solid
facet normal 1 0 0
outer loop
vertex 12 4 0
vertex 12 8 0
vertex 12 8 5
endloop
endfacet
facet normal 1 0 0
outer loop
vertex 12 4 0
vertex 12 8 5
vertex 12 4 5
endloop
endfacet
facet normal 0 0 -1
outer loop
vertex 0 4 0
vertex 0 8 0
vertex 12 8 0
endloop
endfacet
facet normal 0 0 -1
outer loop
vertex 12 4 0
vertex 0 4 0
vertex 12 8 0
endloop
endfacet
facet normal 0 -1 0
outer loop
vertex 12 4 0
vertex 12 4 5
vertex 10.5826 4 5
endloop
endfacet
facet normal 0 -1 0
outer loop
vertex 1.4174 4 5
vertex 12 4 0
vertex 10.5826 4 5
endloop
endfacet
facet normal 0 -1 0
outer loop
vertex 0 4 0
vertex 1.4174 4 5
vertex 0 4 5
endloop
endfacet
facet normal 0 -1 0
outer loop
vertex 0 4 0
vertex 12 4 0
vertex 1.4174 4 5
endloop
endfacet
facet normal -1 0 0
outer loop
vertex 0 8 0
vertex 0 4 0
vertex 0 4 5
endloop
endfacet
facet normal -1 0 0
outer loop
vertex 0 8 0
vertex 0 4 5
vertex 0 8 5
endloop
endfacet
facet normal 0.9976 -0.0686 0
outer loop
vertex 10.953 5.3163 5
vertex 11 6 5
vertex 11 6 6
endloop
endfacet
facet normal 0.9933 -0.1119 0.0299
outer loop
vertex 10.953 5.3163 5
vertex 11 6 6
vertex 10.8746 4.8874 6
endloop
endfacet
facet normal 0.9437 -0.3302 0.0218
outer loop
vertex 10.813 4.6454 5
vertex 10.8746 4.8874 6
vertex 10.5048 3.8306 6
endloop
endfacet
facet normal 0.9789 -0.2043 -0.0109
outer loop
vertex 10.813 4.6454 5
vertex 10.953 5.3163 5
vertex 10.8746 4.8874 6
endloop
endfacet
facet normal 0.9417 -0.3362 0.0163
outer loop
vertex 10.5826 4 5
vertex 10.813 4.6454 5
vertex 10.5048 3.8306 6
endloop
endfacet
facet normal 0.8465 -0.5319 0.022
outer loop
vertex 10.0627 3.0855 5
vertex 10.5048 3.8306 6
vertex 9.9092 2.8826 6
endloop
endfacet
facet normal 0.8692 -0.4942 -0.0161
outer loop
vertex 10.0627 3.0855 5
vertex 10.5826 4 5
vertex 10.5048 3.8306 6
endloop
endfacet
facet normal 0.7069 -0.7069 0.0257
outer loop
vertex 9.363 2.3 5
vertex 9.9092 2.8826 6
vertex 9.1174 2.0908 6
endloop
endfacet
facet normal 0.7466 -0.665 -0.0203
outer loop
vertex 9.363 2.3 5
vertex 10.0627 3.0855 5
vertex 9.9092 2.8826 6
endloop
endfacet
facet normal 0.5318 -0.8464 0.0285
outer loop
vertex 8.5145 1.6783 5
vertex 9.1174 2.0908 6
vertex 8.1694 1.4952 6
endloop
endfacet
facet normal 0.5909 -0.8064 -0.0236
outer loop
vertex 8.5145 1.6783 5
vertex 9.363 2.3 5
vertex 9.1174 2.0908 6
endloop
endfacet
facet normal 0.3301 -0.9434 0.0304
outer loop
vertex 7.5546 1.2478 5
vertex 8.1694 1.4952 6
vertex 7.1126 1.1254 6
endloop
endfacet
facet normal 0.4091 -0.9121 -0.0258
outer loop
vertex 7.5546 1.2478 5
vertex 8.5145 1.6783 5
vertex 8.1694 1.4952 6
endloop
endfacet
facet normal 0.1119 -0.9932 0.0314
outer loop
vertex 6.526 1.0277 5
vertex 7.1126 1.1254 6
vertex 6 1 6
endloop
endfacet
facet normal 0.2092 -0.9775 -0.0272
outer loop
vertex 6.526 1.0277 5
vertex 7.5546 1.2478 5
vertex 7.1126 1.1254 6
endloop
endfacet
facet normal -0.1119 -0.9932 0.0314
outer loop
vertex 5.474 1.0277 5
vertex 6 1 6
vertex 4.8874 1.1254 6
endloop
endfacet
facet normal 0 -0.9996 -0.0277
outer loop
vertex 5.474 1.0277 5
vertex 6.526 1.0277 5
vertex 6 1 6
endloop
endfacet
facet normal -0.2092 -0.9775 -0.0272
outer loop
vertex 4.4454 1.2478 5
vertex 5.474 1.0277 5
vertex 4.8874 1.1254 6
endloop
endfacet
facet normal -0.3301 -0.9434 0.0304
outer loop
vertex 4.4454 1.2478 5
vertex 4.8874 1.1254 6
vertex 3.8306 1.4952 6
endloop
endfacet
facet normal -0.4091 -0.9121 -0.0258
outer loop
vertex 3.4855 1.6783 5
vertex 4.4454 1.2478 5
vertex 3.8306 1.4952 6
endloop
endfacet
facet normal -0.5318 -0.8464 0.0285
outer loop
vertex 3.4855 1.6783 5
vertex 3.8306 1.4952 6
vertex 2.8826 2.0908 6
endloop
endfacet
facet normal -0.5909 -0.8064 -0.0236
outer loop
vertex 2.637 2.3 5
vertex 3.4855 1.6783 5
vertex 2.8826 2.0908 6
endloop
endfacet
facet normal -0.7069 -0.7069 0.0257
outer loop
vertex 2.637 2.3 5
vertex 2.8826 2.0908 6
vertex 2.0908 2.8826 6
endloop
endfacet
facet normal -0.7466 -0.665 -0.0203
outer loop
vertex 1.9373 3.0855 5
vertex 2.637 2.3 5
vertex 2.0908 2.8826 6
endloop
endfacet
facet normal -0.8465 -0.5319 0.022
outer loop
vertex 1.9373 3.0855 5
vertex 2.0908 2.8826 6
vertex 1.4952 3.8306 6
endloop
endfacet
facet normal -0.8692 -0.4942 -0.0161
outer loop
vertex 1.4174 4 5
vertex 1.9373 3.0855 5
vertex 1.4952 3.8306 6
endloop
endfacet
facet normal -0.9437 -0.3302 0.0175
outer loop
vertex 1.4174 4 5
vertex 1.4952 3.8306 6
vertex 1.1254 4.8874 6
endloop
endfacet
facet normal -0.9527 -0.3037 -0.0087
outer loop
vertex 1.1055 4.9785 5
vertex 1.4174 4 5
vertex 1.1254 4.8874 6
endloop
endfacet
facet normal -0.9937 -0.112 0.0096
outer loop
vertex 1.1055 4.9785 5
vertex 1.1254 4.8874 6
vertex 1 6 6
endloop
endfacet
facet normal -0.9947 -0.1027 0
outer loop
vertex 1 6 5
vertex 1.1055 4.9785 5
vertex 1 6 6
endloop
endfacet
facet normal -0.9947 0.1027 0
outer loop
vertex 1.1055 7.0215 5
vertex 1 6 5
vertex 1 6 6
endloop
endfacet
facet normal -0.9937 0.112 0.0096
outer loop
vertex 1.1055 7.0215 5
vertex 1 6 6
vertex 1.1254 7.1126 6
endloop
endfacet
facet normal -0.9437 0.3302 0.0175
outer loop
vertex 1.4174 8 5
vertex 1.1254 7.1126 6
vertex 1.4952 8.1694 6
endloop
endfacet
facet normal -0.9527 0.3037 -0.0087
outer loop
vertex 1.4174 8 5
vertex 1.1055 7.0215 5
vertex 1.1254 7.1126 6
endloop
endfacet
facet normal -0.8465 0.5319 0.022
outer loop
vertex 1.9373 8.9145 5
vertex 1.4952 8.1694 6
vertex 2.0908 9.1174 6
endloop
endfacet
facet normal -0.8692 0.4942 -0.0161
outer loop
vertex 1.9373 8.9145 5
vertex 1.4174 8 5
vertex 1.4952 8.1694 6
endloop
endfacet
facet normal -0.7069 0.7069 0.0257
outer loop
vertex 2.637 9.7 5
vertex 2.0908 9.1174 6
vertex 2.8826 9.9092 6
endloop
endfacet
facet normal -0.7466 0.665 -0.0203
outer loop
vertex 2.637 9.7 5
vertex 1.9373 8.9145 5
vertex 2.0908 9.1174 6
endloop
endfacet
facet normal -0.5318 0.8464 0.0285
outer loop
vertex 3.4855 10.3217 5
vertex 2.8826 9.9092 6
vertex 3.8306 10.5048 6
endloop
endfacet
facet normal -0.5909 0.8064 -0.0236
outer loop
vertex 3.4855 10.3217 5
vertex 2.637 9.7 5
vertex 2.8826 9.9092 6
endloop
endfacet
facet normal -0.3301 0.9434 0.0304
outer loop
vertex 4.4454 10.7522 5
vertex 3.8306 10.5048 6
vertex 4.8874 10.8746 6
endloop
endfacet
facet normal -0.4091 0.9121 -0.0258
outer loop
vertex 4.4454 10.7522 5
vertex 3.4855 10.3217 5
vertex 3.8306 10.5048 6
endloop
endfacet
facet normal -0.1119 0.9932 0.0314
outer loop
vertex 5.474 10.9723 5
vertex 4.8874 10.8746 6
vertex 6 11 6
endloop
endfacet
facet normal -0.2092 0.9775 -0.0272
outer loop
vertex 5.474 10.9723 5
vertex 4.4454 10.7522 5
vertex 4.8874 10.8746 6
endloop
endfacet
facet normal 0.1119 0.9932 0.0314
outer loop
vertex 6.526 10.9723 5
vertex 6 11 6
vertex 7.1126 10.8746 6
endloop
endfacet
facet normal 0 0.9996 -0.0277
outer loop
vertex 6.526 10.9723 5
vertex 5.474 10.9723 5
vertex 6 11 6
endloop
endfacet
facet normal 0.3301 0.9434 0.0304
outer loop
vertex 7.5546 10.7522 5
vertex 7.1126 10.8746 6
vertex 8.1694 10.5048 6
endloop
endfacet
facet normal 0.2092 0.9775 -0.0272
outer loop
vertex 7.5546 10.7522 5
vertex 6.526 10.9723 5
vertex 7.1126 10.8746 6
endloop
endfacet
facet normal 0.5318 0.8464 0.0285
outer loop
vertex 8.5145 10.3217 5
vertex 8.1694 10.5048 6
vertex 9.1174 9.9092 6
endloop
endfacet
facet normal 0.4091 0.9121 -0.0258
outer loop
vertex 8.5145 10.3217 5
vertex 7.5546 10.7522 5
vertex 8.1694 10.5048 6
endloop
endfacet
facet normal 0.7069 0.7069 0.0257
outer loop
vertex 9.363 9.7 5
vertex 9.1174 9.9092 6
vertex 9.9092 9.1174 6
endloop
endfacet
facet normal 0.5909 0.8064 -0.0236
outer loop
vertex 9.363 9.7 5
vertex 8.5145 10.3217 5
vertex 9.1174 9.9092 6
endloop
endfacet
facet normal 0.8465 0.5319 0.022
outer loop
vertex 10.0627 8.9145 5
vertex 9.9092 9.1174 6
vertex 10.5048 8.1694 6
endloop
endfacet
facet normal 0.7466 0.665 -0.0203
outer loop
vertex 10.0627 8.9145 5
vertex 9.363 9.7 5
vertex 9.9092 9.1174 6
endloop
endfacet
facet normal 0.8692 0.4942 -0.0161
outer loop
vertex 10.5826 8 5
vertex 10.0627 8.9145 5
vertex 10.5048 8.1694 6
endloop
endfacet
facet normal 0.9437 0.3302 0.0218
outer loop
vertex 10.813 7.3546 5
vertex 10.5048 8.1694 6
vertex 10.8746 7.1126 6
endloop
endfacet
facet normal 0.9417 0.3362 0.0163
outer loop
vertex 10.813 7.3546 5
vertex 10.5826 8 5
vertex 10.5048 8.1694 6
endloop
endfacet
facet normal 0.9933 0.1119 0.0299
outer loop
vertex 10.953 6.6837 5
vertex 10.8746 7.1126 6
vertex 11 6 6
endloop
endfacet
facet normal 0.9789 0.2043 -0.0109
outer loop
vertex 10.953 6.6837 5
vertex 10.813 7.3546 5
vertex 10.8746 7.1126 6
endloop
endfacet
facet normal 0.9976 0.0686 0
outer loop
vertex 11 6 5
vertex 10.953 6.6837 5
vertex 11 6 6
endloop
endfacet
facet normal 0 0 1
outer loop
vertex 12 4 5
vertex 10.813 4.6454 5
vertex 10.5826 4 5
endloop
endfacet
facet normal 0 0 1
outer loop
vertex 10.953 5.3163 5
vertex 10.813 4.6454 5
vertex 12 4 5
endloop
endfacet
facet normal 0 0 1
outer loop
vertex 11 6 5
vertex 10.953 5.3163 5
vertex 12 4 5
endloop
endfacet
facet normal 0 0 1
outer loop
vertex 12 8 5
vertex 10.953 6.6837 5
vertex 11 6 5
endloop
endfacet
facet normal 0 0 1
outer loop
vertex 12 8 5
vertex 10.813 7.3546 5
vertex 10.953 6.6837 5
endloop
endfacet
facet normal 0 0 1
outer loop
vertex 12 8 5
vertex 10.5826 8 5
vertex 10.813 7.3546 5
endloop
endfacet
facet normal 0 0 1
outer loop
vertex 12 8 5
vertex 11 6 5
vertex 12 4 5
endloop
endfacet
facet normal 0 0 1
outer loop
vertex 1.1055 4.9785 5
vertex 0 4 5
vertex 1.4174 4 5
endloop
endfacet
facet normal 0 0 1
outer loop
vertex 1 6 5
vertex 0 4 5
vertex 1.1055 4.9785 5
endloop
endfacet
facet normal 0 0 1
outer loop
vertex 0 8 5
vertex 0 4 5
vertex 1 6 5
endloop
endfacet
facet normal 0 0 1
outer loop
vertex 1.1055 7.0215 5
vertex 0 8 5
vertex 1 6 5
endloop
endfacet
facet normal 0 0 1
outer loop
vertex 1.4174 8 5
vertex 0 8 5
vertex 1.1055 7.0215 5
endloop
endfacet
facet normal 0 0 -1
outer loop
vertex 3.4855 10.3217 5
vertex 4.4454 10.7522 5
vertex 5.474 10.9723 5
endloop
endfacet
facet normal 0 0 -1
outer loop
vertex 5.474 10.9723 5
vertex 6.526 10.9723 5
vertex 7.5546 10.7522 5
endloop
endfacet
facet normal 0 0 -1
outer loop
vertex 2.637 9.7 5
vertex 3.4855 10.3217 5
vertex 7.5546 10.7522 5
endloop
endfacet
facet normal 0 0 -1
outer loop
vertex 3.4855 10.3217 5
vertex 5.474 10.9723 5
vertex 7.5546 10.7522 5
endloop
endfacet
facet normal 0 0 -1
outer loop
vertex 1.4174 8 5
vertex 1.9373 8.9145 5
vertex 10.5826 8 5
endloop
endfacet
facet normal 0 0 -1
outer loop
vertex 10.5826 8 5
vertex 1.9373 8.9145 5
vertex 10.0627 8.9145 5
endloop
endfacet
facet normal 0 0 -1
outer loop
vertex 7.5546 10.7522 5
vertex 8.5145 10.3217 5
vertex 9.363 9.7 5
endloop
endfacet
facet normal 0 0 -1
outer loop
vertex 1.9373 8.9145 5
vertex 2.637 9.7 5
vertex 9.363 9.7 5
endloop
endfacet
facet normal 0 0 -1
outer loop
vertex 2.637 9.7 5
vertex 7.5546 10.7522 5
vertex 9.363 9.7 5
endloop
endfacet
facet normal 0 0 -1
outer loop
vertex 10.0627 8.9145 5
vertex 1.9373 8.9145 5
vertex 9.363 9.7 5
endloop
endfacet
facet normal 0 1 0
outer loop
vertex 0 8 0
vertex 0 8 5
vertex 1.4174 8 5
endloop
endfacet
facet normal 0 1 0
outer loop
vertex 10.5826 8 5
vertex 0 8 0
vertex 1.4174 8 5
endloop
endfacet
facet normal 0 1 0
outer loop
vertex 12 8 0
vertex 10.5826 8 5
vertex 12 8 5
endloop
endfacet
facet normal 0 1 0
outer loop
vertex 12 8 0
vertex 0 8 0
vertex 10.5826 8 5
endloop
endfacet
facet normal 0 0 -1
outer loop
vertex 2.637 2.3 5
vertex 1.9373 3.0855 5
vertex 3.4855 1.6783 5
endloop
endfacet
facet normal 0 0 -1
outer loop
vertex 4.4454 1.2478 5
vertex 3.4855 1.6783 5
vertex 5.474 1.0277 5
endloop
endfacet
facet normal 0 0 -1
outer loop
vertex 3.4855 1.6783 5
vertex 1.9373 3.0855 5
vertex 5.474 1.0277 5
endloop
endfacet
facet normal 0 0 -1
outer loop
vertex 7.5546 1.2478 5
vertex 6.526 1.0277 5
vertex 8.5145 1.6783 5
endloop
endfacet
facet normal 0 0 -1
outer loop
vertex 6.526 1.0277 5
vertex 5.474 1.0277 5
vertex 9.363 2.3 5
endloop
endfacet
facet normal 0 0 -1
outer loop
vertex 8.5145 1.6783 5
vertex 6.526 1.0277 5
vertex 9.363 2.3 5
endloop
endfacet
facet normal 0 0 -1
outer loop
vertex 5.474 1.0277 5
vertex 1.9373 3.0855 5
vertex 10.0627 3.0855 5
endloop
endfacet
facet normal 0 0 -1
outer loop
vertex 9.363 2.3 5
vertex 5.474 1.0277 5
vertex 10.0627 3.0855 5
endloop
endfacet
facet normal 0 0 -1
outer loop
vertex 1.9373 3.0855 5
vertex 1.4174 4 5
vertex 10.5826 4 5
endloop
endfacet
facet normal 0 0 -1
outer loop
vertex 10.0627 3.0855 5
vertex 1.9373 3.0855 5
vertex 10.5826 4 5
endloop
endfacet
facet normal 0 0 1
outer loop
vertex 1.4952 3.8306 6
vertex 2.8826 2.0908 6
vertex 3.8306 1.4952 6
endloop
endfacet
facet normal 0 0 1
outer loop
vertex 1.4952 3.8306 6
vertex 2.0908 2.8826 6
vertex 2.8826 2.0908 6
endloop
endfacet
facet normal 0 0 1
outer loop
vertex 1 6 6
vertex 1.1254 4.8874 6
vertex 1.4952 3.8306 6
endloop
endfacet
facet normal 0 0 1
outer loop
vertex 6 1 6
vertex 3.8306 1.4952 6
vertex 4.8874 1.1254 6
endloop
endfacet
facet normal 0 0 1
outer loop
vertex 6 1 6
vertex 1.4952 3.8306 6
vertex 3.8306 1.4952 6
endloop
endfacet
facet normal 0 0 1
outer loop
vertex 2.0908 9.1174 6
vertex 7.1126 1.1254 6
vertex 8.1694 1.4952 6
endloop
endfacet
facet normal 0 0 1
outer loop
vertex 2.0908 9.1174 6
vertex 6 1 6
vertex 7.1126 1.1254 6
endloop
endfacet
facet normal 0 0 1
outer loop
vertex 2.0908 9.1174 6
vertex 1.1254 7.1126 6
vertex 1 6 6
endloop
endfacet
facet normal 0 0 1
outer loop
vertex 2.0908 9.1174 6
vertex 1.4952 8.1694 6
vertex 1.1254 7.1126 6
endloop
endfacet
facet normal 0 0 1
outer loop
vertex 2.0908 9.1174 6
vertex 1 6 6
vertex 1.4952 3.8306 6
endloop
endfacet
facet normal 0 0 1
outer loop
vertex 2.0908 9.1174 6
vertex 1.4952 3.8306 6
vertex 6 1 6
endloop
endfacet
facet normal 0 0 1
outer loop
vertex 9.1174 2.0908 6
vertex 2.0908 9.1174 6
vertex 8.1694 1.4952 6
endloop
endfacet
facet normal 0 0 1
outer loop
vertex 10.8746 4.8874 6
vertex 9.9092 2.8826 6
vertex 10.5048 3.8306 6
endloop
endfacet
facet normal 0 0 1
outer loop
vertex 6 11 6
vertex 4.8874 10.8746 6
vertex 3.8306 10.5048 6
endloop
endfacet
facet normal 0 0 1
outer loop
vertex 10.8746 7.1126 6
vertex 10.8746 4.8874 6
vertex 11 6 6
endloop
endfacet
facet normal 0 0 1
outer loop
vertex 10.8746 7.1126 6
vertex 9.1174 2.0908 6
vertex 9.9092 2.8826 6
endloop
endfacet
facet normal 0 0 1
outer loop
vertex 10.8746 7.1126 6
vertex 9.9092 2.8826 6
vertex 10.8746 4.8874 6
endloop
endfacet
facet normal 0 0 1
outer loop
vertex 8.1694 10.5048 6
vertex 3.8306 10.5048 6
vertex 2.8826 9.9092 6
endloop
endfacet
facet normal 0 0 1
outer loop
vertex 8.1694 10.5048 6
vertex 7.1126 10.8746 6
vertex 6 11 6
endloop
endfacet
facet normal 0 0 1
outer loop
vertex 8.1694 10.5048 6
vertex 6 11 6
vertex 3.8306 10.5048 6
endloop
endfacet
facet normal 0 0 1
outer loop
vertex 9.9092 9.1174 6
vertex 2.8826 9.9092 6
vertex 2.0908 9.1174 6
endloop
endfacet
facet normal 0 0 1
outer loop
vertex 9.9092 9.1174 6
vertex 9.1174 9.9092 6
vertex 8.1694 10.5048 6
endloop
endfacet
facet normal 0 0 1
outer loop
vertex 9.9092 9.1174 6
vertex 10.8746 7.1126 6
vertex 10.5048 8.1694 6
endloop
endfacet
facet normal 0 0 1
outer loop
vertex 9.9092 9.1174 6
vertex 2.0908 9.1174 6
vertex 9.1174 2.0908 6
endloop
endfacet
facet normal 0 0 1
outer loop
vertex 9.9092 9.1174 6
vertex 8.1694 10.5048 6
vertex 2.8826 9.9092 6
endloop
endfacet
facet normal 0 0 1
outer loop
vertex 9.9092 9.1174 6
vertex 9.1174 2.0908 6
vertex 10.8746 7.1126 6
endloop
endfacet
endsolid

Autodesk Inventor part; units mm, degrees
ref_plane "YZ Plane" through (0, 0, 0) normal (1, 0, 0) x (0, 1, 0)
ref_plane "XZ Plane" through (0, 0, 0) normal (0, 1, 0) x (-1, 0, 0)
ref_plane "XY Plane" through (0, 0, 0) normal (0, 0, 1) x (1, 0, 0)
sketch "Sketch1" plane through (0, 0, 0) normal (0, 0, 1) x (1, 0, 0)
  line L0 (0, 6) -> (0, 8)
  line L1 (0, 8) -> (12, 8)
  line L2 (12, 8) -> (12, 4)
  line L3 (12, 4) -> (0, 4)
  line L4 (0, 6) -> (0, 4)
  point P0 (0, 0)
  dimension "d2" = 2
  dimension "d3" = 4
extrude "Extrusion1" add sketch "Sketch1" along normal blind 5
sketch "Sketch2" plane through (0, 0, 5) normal (0, 0, 1) x (1, 0, 0)
  line L0 (0, 8) -> (0, 4) projected
  line L1 (12, 4) -> (12, 8) projected
  line L2 (12, 8) -> (0, 8) projected
  line L3 (0, 4) -> (12, 4) projected
  line L4 (0, 6) -> (12, 6)
  line L5 (6, 8) -> (6, 4)
  circle A0 centre (6, 6) radius 5
  point P0 (0, 0)
  dimension "d9" = 10
extrude "Extrusion3" add sketch "Sketch2" along normal blind 1 contours A0 L2 | L2 L5 L4 A0 | L4 L5 L3 A0 | L2 A0 L4 L5 | L3 A0 | L4 A0 L3 L5
properties part number "MinusBtn"
